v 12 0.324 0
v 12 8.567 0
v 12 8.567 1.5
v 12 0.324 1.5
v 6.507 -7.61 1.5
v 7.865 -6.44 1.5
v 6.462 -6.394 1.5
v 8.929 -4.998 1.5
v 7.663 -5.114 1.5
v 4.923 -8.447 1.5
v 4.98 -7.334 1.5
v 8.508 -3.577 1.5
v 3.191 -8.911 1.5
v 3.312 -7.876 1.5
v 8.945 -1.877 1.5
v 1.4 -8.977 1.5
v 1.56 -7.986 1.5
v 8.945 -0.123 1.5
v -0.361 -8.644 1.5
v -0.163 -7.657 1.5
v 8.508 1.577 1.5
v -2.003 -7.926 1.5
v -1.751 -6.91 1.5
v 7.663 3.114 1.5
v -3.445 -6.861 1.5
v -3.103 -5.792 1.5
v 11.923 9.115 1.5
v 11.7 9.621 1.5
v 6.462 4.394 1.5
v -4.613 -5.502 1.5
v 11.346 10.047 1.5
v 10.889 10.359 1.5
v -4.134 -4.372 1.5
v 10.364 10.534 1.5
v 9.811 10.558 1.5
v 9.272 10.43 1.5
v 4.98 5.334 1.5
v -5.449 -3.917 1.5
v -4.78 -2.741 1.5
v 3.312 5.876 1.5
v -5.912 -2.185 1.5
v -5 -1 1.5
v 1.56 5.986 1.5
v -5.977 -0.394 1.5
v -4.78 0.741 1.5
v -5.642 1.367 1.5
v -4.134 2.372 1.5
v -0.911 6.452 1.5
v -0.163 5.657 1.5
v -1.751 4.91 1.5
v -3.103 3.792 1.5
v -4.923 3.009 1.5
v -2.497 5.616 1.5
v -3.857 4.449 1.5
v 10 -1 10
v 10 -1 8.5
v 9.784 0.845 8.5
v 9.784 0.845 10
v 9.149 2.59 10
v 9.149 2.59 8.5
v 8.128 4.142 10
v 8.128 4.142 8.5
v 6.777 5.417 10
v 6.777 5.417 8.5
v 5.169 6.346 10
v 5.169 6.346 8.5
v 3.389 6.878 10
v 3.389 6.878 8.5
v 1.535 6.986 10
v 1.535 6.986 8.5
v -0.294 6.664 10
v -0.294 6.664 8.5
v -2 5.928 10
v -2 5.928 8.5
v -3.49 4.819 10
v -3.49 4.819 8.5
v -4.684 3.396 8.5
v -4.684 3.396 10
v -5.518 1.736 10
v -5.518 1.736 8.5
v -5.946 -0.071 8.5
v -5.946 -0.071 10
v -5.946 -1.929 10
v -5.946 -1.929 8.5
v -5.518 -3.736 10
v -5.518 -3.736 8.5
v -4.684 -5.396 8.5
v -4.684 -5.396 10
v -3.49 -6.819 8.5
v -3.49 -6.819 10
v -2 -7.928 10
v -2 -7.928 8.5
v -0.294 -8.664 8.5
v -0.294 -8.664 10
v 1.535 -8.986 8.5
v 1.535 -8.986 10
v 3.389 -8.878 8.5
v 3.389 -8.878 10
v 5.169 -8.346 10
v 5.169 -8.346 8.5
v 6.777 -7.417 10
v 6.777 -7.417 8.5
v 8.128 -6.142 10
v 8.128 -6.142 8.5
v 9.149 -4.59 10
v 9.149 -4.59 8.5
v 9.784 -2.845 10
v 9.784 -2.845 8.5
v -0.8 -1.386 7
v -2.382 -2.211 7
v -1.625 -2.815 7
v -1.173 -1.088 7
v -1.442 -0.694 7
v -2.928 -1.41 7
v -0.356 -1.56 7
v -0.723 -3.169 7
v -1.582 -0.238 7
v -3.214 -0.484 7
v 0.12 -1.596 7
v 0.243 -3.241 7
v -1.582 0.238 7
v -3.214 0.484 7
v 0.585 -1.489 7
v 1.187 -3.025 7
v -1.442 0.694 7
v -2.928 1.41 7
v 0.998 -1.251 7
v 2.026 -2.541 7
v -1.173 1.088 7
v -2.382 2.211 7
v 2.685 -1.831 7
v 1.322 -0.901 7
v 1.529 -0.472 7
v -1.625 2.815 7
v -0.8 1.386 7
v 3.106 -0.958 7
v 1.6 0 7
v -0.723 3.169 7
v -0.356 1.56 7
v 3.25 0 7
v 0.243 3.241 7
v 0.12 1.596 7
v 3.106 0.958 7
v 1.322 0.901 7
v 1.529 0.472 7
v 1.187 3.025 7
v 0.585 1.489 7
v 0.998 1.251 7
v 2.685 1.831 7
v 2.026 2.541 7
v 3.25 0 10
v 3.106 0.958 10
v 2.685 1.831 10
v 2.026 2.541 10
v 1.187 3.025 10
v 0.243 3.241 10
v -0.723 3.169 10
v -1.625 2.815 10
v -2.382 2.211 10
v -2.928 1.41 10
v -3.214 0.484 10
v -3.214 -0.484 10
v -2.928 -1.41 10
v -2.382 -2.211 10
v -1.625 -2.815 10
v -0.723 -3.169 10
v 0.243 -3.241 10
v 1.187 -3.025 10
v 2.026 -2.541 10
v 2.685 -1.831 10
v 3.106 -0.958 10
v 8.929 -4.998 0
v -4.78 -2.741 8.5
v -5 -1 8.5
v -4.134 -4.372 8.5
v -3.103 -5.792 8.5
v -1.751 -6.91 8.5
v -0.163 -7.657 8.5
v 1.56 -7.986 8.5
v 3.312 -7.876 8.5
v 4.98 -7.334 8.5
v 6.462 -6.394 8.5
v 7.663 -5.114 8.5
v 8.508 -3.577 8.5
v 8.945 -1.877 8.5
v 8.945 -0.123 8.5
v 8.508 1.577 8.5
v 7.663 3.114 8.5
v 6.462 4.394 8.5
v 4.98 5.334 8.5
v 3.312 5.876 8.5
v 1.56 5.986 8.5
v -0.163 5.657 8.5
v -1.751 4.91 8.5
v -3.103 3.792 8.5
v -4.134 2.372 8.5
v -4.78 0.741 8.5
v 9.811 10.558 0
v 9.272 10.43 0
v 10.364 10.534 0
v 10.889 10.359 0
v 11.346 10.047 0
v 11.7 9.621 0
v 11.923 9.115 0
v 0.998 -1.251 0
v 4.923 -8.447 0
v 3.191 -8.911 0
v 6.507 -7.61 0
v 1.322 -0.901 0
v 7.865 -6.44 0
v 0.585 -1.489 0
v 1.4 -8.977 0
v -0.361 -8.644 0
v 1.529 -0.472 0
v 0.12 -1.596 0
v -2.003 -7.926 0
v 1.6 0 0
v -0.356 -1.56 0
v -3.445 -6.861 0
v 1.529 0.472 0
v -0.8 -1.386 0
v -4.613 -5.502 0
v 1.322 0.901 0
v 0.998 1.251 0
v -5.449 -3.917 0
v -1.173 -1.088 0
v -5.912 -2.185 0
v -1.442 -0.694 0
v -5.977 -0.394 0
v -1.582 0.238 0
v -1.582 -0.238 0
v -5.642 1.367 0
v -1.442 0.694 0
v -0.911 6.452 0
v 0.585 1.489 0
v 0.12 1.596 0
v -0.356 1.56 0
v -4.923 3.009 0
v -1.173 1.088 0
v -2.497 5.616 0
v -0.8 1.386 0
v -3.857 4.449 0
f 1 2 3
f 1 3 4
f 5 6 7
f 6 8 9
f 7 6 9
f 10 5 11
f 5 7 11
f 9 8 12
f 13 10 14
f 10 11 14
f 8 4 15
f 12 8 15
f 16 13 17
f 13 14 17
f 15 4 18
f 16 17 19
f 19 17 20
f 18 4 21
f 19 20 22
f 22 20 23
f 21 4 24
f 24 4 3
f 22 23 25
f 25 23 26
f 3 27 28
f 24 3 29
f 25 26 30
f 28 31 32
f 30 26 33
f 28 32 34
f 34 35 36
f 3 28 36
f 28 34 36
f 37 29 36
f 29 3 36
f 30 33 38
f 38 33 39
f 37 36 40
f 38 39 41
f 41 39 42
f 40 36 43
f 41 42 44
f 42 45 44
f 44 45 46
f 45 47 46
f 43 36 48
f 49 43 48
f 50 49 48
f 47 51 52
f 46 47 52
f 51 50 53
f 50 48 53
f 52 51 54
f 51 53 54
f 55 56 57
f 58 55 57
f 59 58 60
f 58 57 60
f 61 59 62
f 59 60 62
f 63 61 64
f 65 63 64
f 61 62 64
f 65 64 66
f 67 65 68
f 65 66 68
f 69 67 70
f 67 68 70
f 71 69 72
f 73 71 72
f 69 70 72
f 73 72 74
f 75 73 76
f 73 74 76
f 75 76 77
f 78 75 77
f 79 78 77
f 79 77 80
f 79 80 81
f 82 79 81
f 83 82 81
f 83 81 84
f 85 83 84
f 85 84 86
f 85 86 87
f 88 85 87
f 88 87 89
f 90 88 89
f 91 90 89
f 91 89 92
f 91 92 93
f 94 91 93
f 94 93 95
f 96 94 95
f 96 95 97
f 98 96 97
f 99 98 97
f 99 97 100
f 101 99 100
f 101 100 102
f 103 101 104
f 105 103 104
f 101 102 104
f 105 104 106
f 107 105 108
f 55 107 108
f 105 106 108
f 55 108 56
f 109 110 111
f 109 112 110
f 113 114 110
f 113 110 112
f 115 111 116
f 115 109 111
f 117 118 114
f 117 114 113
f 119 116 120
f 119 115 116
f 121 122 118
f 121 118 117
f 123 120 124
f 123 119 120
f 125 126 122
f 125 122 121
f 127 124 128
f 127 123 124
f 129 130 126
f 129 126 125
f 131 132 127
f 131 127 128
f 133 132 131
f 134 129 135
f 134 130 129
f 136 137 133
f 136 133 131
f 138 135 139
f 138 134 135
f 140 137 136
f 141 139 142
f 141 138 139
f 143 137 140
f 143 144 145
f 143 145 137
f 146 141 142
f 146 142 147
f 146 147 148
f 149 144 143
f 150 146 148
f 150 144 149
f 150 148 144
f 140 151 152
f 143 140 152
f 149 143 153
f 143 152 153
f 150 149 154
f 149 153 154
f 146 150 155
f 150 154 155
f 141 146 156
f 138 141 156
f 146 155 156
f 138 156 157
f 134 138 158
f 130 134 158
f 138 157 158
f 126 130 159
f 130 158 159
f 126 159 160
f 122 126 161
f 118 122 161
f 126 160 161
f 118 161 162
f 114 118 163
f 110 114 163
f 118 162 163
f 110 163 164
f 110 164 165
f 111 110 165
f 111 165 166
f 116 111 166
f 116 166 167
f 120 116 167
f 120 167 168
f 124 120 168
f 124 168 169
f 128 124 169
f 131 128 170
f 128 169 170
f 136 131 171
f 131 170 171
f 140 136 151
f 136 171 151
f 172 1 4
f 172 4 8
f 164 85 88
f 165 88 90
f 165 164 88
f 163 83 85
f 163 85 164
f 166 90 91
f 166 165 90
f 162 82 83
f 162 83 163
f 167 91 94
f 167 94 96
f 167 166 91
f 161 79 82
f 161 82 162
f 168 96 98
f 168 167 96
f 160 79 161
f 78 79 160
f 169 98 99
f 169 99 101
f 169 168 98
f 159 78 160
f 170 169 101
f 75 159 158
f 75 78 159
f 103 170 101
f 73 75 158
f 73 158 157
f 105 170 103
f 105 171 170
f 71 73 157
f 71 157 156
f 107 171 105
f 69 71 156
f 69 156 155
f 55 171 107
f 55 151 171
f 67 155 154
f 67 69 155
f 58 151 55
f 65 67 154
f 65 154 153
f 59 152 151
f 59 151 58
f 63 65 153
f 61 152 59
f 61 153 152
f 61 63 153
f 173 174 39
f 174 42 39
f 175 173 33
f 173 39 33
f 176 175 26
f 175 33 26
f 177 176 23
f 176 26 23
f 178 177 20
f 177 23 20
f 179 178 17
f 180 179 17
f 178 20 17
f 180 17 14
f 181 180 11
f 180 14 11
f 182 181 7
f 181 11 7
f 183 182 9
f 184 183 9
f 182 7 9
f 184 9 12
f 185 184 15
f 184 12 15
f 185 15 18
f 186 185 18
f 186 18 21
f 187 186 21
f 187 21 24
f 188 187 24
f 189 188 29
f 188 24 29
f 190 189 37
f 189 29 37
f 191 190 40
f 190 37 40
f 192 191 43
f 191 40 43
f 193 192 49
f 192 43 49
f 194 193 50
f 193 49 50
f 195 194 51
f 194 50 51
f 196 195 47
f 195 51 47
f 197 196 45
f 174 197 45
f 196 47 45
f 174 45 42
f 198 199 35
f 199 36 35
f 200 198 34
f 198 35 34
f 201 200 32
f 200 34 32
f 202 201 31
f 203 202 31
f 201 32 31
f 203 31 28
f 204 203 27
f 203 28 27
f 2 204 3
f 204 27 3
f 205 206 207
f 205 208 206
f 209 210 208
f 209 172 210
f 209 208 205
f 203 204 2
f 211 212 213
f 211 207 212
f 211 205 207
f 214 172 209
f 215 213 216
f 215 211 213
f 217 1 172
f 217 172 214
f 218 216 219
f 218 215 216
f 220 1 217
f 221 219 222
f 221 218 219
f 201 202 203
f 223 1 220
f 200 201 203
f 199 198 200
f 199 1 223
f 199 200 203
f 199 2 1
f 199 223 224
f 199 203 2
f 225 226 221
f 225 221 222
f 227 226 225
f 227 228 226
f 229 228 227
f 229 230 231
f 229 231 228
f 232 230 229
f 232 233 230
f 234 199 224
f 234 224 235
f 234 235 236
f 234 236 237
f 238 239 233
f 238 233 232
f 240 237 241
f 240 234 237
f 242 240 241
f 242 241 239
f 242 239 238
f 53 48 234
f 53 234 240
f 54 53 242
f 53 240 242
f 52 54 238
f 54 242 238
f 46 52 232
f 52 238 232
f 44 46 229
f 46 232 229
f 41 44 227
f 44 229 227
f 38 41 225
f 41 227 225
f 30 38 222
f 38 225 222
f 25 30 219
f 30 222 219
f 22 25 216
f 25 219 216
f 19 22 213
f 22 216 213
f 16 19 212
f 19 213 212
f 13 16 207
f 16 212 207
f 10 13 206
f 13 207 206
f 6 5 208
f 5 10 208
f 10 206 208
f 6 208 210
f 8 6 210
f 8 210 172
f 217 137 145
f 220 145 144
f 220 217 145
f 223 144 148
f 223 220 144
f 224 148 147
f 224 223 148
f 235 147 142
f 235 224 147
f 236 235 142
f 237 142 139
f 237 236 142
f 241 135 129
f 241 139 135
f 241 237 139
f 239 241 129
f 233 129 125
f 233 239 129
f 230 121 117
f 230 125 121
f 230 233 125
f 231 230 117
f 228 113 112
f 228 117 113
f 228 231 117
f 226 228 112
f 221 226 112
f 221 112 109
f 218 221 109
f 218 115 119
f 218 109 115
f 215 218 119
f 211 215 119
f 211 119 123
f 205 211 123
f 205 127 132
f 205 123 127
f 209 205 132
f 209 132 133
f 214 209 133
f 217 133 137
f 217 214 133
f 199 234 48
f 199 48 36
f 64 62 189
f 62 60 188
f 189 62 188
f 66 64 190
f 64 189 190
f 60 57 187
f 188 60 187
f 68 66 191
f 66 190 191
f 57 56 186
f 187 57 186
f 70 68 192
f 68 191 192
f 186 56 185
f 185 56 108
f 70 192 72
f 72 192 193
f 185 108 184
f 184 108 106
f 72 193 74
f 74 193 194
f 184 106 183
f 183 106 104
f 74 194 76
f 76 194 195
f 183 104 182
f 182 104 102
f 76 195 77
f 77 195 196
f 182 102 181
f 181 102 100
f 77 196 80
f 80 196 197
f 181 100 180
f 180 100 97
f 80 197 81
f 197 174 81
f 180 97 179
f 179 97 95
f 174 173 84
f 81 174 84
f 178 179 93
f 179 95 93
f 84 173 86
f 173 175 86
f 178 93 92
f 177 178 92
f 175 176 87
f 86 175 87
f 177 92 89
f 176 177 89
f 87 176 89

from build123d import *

# Parameters (mm, degrees)
SKETCH1_R           = 8
SKETCH1_R_2         = 1.6
BOSS_EXTRUDE1_DEPTH = 10
SKETCH2_R           = 3.25
CUT_EXTRUDE1_DEPTH  = 3
SKETCH3_W           = 6.504954041
SKETCH3_H           = 7
BOSS_EXTRUDE2_DEPTH = 1.5
FILLET1_R           = 2


with BuildPart() as part:
    # Sketch1 → Boss-Extrude1 (new body)
    with BuildSketch(Plane.XY):
        with Locations((2, -1)):
            Circle(SKETCH1_R)
        Circle(SKETCH1_R_2, mode=Mode.SUBTRACT)
    extrude(amount=BOSS_EXTRUDE1_DEPTH)

    # Sketch2 → Cut-Extrude1 (cut)
    with BuildSketch(Plane.XY.offset(10)):
        Circle(SKETCH2_R)
    extrude(amount=-CUT_EXTRUDE1_DEPTH, mode=Mode.SUBTRACT)

    # Sketch3 → Cut-Revolve1 (revolve, cut)
    with BuildSketch(Plane(origin=(0, -1, 0), x_dir=(1, 0, 0), z_dir=(0, 1, 0))):
        with Locations((-8.252477021, -5)):
            Rectangle(SKETCH3_W, SKETCH3_H)
    revolve(axis=Axis((2, -1, 0), (0, 0, 1)), mode=Mode.SUBTRACT)

    # Sketch4 → Boss-Extrude2 (add)
    with BuildSketch(Plane.XY):
        with BuildLine():
            Line((-0.911080318, 6.451550938), (12, 11.49549308))
            Line((12, 11.49549308), (12, 0.324258737))
            Line((12, 0.324258737), (8.929423504, -4.997885679))
            ThreePointArc((8.929423504, -4.997885679), (8.06705614, 4.214482697), (-0.911080318, 6.451550938))
        make_face()
    extrude(amount=BOSS_EXTRUDE2_DEPTH)

    # Fillet1
    fillet1_edges = [part.edges().sort_by_distance(p)[0] for p in [
        (12, 11.49549308, 0.75),
    ]]
    fillet(fillet1_edges, radius=FILLET1_R)


solid = part.part
